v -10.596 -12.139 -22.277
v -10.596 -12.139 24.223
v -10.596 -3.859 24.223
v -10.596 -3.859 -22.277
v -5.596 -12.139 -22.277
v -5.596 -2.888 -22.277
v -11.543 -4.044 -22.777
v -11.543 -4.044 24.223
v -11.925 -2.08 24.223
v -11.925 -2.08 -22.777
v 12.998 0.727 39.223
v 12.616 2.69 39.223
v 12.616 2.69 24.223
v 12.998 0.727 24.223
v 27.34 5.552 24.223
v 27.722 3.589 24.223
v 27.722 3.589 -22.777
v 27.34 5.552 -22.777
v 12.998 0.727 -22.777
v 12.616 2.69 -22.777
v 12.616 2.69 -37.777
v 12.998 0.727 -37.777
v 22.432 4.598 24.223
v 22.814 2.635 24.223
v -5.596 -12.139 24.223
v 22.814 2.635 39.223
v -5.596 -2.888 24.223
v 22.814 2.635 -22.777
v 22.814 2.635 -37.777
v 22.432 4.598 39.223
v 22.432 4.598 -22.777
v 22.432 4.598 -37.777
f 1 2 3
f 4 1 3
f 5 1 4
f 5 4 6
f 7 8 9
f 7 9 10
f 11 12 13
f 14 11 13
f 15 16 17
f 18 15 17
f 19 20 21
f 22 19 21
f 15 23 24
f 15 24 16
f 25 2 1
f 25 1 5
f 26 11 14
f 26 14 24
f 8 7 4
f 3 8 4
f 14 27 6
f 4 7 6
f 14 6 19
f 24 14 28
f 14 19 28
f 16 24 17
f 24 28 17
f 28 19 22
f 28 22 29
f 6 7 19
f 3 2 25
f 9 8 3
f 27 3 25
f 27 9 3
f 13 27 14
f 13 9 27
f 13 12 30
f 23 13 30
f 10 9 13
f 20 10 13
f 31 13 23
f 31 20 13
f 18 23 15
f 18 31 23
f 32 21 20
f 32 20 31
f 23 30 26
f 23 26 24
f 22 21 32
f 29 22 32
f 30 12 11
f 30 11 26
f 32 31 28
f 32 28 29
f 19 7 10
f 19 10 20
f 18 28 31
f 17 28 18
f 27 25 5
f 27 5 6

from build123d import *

# Parameters (mm, degrees)
SKETCH1_W             = 40
SKETCH1_H             = 47
BOSS_EXTRUDE1_DEPTH   = 2
BODY_MOVE_COPY1_ANGLE = 11
SKETCH2_W             = 5
SKETCH2_H             = 10
BOSS_EXTRUDE2_DEPTH   = 46.5
SKETCH4_W             = 10
SKETCH4_H             = 15
BOSS_EXTRUDE3_DEPTH   = 2
SKETCH5_W             = 10
SKETCH5_H             = 15
BOSS_EXTRUDE4_DEPTH   = 2


with BuildPart() as part:
    # Sketch1 → Boss-Extrude1 (new body)
    with BuildSketch(Plane(origin=(0, 0, 0), x_dir=(1, 0, 0), z_dir=(0, 1, 0))):
        with Locations((7.778638156, -0.723210277)):
            Rectangle(SKETCH1_W, SKETCH1_H)
    extrude(amount=BOSS_EXTRUDE1_DEPTH)


with BuildPart() as part_1:
    # Body-Move/Copy1: moved
    add(part.part.rotate(Axis((9.114441417, 1.5, 0), (0, 0, 1)), BODY_MOVE_COPY1_ANGLE))

    # Sketch2 → Boss-Extrude2 (add)
    with BuildSketch(Plane(origin=(0.351616414, 0, 24.223210277), x_dir=(1, 0, 0), z_dir=(0, 0, 1))):
        with Locations((-8.447854102, -7.138980591)):
            Rectangle(SKETCH2_W, SKETCH2_H)
    extrude(amount=-BOSS_EXTRUDE2_DEPTH)

    # Sketch4 → Boss-Extrude3 (add)
    with BuildSketch(Plane(origin=(-0.044520197, 0.229036558, 0), x_dir=(0.9816271834475203, 0.19080899537728402, 0), z_dir=(-0.190808995377284, 0.9816271834475203, 0))):
        with Locations((17.897393689, -31.723210277)):
            Rectangle(SKETCH4_W, SKETCH4_H)
    extrude(amount=-BOSS_EXTRUDE3_DEPTH)

    # Sketch5 → Boss-Extrude4 (add)
    with BuildSketch(Plane(origin=(-0.044520197, 0.229036558, 0), x_dir=(0.9816271834475203, 0.19080899537728402, 0), z_dir=(-0.190808995377284, 0.9816271834475203, 0))):
        with Locations((17.897393689, 30.276789723)):
            Rectangle(SKETCH5_W, SKETCH5_H)
    extrude(amount=-BOSS_EXTRUDE4_DEPTH)


solid = part_1.part
